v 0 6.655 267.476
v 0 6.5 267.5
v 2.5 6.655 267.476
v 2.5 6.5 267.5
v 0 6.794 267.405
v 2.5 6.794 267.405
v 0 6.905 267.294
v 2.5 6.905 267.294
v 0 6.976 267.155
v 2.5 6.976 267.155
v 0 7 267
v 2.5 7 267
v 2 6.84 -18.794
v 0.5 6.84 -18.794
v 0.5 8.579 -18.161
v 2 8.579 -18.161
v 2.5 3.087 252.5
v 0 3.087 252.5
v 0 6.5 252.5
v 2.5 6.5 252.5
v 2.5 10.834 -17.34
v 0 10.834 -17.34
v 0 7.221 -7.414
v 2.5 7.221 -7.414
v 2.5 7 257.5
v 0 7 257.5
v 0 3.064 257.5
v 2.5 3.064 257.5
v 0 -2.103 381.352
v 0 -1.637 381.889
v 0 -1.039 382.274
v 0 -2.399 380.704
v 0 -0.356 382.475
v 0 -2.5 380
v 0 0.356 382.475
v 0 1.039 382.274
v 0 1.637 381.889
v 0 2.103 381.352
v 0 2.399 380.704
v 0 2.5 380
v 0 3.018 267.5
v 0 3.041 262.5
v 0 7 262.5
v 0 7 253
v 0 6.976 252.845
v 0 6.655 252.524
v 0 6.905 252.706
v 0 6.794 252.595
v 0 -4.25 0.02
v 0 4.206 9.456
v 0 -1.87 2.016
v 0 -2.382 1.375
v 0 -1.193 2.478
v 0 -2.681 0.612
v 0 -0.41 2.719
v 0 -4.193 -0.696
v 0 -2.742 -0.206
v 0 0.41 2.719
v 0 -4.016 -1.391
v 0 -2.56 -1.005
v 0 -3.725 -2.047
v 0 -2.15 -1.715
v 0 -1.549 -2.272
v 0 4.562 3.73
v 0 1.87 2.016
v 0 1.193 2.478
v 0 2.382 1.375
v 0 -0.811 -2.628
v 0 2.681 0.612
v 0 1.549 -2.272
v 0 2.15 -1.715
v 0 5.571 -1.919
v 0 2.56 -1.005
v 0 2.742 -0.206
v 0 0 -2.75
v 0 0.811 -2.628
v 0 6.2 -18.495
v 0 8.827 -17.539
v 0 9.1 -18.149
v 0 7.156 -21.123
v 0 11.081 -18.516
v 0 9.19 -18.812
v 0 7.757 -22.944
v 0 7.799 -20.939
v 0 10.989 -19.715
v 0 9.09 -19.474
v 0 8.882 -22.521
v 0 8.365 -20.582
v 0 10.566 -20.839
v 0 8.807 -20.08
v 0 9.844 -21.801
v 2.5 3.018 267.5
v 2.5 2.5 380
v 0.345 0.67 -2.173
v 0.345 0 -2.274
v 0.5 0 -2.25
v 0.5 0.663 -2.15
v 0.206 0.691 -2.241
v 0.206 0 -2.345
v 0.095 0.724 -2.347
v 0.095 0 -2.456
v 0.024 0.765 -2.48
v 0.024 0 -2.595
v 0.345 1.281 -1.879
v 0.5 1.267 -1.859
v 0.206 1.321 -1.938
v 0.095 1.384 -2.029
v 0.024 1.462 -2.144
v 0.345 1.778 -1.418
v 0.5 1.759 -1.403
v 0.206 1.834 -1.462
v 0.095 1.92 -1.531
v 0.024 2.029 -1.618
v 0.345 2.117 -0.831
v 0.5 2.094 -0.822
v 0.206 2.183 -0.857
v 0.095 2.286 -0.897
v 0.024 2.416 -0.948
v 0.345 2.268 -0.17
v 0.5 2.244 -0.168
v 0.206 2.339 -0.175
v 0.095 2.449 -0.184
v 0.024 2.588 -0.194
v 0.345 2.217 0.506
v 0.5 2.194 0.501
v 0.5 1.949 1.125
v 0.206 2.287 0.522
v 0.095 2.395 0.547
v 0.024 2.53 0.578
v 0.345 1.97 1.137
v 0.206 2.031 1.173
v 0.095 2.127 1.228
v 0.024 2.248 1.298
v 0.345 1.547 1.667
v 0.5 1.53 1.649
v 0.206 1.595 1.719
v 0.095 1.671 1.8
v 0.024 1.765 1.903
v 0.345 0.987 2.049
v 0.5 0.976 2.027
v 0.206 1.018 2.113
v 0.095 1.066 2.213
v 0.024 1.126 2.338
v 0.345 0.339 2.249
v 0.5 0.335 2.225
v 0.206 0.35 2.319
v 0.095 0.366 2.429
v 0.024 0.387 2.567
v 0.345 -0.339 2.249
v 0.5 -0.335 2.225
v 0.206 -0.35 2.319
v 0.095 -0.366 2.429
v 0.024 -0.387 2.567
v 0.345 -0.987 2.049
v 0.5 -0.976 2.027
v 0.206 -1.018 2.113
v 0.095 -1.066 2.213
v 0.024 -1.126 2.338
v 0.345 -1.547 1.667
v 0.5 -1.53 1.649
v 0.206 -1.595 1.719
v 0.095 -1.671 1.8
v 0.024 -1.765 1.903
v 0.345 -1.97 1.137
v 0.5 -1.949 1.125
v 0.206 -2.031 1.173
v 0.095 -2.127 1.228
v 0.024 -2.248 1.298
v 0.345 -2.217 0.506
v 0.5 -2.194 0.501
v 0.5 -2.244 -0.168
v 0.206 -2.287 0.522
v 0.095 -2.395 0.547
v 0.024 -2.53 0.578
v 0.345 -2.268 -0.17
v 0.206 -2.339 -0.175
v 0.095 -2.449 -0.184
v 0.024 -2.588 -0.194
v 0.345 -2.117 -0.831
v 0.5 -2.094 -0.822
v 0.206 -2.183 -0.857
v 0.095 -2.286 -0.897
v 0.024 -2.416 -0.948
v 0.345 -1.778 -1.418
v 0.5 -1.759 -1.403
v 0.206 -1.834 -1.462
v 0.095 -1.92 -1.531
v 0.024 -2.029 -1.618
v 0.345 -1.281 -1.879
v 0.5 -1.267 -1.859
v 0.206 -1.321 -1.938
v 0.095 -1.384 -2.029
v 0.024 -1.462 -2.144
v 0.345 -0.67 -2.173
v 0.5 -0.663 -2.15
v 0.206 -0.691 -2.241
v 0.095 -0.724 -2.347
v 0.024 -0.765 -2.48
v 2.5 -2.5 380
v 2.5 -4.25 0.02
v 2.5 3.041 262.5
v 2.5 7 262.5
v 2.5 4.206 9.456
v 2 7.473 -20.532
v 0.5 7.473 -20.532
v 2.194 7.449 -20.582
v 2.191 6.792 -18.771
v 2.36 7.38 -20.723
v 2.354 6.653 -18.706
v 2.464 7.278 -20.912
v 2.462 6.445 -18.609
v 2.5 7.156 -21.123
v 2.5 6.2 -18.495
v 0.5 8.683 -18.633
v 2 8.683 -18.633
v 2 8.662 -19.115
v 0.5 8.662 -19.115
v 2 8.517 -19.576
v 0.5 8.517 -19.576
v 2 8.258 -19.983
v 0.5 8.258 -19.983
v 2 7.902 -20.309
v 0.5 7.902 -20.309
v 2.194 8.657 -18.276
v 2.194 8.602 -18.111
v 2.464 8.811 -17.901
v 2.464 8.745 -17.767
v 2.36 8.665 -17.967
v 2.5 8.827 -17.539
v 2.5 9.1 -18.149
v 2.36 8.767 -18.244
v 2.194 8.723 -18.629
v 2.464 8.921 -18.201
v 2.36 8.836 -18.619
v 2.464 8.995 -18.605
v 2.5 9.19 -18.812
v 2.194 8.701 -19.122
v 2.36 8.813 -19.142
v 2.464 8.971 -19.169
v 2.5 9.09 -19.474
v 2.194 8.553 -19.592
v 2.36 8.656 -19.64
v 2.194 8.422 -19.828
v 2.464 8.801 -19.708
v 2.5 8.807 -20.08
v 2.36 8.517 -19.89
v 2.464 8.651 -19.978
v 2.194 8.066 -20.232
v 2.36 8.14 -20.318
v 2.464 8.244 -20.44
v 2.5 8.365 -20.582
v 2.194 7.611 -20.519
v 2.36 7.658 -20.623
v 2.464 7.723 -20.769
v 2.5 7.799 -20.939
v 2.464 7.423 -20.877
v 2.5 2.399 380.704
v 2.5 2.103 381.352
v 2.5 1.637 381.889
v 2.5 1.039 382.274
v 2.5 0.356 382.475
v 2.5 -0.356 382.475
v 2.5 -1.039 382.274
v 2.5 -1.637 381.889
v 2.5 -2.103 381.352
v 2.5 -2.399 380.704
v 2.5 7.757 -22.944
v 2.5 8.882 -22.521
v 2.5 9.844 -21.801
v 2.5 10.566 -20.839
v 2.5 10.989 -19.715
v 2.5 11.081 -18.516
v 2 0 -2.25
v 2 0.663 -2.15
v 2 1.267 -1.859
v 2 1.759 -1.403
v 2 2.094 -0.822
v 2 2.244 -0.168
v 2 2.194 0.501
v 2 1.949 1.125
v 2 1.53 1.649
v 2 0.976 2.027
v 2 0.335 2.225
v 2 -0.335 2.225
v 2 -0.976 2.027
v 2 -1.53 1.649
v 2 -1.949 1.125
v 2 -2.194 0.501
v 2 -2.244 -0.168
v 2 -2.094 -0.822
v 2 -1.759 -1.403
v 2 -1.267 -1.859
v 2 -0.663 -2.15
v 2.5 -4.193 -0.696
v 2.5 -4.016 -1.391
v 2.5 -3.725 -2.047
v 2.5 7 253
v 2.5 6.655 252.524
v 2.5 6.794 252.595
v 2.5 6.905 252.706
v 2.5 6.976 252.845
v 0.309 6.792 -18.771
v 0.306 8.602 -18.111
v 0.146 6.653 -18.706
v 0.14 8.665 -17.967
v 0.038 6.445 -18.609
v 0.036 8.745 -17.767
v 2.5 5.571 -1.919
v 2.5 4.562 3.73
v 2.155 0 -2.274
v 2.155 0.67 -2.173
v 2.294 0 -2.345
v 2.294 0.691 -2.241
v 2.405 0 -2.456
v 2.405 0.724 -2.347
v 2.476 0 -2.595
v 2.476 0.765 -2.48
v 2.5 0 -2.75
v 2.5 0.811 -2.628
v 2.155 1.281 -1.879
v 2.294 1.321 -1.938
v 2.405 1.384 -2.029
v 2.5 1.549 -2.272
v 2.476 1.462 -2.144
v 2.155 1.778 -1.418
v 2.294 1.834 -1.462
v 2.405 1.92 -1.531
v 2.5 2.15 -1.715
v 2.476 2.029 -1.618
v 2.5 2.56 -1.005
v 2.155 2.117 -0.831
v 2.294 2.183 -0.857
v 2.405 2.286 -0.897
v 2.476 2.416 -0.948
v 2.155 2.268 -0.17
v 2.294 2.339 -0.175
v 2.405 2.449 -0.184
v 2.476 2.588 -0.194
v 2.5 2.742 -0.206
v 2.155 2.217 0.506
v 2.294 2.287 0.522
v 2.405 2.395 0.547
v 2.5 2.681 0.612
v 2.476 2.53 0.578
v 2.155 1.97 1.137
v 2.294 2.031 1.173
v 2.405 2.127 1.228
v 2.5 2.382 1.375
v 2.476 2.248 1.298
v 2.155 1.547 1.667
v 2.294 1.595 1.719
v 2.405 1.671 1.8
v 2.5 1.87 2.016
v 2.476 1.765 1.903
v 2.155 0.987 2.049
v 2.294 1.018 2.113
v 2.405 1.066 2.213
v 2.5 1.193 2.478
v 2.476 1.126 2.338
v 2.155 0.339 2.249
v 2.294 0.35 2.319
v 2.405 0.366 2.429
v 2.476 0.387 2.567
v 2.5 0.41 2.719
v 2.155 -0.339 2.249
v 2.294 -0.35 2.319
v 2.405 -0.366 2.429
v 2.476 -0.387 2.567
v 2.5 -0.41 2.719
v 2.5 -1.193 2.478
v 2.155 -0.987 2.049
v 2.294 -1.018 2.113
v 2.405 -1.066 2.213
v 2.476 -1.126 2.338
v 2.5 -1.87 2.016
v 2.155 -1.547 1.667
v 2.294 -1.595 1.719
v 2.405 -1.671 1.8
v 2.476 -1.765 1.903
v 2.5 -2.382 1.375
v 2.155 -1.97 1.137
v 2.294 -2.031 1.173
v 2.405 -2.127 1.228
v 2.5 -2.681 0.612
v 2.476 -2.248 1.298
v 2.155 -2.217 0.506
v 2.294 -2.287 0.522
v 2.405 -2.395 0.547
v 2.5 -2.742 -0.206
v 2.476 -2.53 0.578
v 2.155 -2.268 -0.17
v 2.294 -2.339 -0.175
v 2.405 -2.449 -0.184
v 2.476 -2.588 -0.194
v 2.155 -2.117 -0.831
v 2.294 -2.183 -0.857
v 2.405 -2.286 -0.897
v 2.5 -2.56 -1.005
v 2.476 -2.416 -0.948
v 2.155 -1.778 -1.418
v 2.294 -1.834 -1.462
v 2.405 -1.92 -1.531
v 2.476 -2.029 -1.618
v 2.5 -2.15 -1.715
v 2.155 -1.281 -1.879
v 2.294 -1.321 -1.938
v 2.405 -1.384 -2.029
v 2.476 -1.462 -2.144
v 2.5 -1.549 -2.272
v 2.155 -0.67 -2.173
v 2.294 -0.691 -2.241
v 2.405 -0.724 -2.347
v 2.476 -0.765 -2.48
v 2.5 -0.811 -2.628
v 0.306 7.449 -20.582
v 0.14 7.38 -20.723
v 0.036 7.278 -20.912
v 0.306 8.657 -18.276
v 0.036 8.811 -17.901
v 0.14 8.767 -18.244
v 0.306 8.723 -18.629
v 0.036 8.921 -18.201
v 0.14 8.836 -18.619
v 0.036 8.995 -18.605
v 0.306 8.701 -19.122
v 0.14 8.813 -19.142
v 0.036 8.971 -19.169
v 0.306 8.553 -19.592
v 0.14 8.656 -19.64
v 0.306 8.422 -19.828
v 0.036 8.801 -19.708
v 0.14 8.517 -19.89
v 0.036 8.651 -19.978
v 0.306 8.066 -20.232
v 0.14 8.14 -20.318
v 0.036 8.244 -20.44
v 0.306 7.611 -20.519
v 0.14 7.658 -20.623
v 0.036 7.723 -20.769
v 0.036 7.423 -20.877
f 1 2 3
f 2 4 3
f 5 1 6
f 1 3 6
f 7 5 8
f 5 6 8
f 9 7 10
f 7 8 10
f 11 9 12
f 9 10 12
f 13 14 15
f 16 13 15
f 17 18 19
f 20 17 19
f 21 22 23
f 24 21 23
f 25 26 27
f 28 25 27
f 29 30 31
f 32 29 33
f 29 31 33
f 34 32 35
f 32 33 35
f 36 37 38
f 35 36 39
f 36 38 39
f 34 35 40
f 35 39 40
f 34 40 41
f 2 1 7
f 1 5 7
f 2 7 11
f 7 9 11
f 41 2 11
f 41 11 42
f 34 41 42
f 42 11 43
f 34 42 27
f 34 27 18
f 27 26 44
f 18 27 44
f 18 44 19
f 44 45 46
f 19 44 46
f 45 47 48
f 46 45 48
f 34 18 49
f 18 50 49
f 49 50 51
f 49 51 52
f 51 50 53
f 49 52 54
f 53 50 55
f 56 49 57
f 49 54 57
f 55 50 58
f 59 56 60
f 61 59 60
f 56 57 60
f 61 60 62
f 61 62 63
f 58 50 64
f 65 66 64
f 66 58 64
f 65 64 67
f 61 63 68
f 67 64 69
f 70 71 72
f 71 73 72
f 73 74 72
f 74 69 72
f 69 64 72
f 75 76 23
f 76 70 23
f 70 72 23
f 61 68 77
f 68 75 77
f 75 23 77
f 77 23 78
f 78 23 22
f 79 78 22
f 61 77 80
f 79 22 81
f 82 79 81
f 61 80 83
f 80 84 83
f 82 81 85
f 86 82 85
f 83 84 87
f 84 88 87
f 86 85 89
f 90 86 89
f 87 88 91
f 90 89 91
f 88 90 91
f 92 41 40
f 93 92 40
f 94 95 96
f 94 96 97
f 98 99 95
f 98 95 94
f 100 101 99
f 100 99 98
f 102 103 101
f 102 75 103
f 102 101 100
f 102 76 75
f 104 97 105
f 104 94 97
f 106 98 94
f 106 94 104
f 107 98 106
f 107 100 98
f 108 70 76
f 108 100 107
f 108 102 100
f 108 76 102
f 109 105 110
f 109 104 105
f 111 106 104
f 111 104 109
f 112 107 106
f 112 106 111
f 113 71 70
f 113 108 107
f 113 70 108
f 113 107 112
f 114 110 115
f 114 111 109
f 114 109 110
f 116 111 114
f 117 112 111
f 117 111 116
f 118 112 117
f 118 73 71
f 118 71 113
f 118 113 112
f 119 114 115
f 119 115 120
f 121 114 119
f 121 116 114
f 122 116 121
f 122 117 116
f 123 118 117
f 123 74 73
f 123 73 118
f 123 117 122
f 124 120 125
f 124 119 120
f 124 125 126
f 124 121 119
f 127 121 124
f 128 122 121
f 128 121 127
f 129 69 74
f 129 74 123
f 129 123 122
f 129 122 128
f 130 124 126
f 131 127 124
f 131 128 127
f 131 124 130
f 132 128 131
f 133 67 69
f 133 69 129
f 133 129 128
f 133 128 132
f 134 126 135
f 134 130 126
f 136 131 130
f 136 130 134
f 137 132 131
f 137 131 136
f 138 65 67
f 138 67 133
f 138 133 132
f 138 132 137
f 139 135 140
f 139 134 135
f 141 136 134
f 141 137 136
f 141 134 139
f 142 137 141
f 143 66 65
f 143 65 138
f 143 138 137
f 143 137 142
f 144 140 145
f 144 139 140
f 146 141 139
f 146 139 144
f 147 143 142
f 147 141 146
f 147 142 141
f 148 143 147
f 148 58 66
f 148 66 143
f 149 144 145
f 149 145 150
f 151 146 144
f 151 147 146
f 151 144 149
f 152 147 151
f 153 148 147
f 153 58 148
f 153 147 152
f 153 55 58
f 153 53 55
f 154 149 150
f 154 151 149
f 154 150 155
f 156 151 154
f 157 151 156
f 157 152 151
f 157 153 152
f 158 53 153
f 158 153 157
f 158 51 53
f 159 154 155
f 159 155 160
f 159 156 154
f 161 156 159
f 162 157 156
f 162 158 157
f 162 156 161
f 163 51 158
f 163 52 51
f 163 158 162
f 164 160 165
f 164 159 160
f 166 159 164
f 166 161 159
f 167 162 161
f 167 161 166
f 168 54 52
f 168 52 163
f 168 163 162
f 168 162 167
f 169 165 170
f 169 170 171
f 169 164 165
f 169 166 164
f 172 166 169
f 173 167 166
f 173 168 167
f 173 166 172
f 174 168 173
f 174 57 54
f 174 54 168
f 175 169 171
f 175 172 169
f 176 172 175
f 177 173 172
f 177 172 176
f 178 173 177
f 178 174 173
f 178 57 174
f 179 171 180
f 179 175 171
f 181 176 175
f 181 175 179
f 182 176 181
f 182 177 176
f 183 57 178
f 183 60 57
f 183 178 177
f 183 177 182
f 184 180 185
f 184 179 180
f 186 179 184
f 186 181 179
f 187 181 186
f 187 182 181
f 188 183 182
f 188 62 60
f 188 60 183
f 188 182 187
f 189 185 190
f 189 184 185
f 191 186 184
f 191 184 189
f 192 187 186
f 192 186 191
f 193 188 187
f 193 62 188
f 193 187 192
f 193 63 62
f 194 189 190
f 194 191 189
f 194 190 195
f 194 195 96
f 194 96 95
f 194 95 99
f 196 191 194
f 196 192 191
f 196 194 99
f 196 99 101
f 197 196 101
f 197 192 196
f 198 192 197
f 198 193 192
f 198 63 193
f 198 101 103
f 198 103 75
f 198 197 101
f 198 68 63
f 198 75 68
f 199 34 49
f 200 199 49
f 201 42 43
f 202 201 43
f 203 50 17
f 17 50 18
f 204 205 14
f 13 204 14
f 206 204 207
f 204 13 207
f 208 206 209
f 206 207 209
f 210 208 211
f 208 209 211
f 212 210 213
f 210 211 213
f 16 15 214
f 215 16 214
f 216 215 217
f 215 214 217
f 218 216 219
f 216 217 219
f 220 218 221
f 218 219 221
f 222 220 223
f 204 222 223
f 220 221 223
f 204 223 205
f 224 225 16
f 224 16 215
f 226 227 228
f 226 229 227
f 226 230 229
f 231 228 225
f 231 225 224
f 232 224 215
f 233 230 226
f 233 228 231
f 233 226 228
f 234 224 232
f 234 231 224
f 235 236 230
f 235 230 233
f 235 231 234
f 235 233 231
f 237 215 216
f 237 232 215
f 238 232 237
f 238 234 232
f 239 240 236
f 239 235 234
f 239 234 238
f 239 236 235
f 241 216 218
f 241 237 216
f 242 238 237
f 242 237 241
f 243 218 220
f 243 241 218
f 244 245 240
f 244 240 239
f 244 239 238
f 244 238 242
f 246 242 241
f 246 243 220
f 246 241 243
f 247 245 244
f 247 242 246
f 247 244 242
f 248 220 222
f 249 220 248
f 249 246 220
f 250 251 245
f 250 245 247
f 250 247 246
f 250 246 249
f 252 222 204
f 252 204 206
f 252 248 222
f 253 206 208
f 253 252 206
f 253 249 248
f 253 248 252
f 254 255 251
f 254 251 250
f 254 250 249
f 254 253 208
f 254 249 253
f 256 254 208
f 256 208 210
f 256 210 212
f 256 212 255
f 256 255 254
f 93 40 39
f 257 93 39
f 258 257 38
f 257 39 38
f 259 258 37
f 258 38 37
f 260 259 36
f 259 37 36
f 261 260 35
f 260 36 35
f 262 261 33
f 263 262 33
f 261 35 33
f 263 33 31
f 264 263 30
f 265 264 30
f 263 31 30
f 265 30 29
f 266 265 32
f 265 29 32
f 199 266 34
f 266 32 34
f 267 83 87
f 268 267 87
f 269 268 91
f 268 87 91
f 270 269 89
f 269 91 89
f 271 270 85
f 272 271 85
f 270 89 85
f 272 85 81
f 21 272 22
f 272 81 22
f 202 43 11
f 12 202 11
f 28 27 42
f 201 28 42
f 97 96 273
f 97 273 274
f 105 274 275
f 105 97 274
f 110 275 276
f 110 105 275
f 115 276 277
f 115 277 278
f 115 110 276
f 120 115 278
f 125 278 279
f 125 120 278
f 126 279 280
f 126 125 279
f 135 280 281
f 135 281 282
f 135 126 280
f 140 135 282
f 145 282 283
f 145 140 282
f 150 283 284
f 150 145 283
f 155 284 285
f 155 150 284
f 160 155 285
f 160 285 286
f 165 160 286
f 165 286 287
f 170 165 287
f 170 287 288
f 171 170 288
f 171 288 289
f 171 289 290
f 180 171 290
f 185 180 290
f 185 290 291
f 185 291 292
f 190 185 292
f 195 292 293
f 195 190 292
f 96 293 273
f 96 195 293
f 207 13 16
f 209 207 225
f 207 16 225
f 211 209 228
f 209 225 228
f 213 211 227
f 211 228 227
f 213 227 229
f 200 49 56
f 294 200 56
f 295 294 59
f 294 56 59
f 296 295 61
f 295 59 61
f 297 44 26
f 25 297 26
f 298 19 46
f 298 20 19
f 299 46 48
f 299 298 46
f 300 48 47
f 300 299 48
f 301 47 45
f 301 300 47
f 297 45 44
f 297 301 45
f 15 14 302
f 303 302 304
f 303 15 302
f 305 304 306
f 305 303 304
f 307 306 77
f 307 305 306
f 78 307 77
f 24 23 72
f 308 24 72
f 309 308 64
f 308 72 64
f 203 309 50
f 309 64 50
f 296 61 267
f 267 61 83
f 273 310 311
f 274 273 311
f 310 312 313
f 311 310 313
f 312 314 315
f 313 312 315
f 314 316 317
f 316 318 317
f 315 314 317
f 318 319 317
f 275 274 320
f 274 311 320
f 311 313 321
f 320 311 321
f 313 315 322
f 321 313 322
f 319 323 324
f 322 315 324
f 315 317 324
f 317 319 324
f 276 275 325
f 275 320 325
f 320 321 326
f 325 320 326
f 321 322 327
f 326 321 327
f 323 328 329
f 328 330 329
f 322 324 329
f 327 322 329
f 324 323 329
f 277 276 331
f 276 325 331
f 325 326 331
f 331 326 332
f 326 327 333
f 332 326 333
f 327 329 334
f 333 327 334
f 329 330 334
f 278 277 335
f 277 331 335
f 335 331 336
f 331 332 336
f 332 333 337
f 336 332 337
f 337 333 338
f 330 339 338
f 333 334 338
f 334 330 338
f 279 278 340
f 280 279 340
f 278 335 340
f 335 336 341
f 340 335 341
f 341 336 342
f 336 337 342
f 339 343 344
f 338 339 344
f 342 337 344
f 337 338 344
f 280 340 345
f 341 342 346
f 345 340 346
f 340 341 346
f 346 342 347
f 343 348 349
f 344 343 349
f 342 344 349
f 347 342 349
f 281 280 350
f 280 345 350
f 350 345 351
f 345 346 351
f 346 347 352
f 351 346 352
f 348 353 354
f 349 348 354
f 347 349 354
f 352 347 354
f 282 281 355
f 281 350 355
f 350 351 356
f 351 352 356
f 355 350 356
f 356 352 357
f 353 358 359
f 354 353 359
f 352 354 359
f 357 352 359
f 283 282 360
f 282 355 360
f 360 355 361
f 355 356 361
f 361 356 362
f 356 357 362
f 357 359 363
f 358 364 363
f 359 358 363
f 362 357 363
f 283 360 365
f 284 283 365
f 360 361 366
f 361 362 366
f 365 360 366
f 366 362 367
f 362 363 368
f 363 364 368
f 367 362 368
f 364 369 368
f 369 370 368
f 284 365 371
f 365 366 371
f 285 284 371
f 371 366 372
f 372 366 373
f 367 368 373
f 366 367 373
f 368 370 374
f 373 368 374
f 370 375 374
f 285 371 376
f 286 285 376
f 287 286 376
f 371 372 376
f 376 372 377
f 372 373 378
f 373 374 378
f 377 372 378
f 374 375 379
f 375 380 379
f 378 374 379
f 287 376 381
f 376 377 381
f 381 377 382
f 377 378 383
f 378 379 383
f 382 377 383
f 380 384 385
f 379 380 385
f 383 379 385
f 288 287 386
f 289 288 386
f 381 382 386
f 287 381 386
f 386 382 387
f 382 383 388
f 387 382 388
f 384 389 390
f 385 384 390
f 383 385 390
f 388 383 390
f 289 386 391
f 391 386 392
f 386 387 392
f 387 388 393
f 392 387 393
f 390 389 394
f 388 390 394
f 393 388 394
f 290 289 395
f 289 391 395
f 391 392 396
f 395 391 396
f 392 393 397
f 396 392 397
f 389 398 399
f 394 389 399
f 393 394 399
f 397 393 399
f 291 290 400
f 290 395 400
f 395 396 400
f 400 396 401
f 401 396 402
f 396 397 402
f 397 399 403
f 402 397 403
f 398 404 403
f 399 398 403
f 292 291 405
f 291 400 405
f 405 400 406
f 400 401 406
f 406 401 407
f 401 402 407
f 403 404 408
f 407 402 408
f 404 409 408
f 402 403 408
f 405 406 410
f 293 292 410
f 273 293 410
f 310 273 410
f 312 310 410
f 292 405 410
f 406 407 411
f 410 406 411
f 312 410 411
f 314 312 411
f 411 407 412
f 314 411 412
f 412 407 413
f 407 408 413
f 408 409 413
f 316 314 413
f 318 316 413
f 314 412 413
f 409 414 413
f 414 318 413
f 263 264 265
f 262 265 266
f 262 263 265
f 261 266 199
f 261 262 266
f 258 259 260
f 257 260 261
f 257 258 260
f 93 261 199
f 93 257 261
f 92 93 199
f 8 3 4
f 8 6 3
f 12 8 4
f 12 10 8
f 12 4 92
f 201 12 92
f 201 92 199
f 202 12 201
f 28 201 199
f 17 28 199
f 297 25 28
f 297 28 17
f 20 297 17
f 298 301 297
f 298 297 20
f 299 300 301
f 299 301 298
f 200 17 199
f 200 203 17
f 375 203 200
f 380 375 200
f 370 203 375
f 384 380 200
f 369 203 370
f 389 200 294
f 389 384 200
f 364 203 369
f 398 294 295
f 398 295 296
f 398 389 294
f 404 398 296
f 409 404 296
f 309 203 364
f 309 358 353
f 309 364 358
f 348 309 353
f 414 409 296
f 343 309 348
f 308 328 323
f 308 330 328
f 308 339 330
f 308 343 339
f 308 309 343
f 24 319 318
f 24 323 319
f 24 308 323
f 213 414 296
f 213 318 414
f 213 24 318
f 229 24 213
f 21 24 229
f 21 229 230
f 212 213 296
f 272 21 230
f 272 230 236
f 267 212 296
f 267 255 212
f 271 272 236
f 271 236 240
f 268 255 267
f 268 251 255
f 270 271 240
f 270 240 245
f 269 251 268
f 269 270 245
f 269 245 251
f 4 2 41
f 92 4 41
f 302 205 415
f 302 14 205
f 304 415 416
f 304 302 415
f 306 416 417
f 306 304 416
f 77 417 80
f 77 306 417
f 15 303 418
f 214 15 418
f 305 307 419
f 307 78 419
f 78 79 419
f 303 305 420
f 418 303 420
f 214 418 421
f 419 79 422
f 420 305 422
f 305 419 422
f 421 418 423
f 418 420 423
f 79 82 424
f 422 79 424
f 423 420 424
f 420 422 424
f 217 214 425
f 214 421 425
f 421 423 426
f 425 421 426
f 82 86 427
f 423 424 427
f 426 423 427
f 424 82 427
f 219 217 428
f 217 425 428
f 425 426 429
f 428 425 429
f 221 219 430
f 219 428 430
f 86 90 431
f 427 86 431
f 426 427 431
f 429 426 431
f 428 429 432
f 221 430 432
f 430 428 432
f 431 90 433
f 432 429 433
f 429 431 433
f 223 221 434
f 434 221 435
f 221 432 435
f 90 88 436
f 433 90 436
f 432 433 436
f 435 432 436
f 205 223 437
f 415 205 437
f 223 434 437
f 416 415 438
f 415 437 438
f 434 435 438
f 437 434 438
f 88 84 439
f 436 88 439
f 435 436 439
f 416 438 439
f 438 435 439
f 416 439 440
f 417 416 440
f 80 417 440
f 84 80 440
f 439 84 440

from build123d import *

# Parameters (mm, degrees)
SKETCH_1_R      = 2.25
EXTRUDE_1_DEPTH = 2.5
FILLET_1_R      = 0.5


with BuildPart() as part:
    # Эскиз1 → Бобышка-Вытянуть1 (new body)
    with BuildSketch(Plane(origin=(0, 0, 0), x_dir=(0, 0, -1), z_dir=(1, 0, 0))):
        with BuildLine():
            ThreePointArc((22.943818195, 7.757072943), (20.83949046, 10.565703525), (17.340266807, 10.834096505))
            Line((17.340266807, 10.834096505), (7.414281192, 7.221333195))
            ThreePointArc((7.414281192, 7.221333195), (-0.89095562, 4.985699873), (-9.456459328, 4.206494465))
            Line((-9.456459328, 4.206494465), (-252.5, 3.087186175))
            Line((-252.5, 3.087186175), (-252.5, 7))
            Line((-252.5, 7), (-257.5, 7))
            Line((-257.5, 7), (-257.5, 3.064159266))
            Line((-257.5, 3.064159266), (-262.5, 3.041132357))
            Line((-262.5, 3.041132357), (-262.5, 7))
            Line((-262.5, 7), (-267.5, 7))
            Line((-267.5, 7), (-267.5, 3.018105448))
            Line((-267.5, 3.018105448), (-380, 2.5))
            ThreePointArc((-380, 2.5), (-382.5, 0), (-380, -2.5))
            Line((-380, -2.5), (-0.019572665, -4.24995493))
            ThreePointArc((-0.019572665, -4.24995493), (1.046958504, -4.119026328), (2.046563679, -3.724792223))
            Line((2.046563679, -3.724792223), (22.943818195, 7.757072943))
        make_face()
        with BuildLine():
            Line((18.793852416, 6.840402867), (18.161115151, 8.578834215))
            ThreePointArc((18.161115151, 8.578834215), (19.5756962, 8.517072273), (20.532283764, 7.473140132))
            Line((20.532283764, 7.473140132), (18.793852416, 6.840402867))
        make_face(mode=Mode.SUBTRACT)
        Circle(SKETCH_1_R, mode=Mode.SUBTRACT)
    extrude(amount=EXTRUDE_1_DEPTH)

    # Скругление1
    fillet_1_edges = [part.edges().sort_by_distance(p)[0] for p in [
        (2.5, 0, 2.25),
        (2.5, 7.156771499, -19.66306809),
        (2.5, 7.709618541, -18.477483783),
        (0, 0, 2.25),
        (0, 7.709618541, -18.477483783),
        (0, 7.156771499, -19.66306809),
        (0, 8.517072273, -19.5756962),
        (1.25, 7, 267.5),
        (1.25, 7, 252.5),
        (2.5, 8.517072273, -19.5756962),
    ]]
    fillet(fillet_1_edges, radius=FILLET_1_R)


solid = part.part
